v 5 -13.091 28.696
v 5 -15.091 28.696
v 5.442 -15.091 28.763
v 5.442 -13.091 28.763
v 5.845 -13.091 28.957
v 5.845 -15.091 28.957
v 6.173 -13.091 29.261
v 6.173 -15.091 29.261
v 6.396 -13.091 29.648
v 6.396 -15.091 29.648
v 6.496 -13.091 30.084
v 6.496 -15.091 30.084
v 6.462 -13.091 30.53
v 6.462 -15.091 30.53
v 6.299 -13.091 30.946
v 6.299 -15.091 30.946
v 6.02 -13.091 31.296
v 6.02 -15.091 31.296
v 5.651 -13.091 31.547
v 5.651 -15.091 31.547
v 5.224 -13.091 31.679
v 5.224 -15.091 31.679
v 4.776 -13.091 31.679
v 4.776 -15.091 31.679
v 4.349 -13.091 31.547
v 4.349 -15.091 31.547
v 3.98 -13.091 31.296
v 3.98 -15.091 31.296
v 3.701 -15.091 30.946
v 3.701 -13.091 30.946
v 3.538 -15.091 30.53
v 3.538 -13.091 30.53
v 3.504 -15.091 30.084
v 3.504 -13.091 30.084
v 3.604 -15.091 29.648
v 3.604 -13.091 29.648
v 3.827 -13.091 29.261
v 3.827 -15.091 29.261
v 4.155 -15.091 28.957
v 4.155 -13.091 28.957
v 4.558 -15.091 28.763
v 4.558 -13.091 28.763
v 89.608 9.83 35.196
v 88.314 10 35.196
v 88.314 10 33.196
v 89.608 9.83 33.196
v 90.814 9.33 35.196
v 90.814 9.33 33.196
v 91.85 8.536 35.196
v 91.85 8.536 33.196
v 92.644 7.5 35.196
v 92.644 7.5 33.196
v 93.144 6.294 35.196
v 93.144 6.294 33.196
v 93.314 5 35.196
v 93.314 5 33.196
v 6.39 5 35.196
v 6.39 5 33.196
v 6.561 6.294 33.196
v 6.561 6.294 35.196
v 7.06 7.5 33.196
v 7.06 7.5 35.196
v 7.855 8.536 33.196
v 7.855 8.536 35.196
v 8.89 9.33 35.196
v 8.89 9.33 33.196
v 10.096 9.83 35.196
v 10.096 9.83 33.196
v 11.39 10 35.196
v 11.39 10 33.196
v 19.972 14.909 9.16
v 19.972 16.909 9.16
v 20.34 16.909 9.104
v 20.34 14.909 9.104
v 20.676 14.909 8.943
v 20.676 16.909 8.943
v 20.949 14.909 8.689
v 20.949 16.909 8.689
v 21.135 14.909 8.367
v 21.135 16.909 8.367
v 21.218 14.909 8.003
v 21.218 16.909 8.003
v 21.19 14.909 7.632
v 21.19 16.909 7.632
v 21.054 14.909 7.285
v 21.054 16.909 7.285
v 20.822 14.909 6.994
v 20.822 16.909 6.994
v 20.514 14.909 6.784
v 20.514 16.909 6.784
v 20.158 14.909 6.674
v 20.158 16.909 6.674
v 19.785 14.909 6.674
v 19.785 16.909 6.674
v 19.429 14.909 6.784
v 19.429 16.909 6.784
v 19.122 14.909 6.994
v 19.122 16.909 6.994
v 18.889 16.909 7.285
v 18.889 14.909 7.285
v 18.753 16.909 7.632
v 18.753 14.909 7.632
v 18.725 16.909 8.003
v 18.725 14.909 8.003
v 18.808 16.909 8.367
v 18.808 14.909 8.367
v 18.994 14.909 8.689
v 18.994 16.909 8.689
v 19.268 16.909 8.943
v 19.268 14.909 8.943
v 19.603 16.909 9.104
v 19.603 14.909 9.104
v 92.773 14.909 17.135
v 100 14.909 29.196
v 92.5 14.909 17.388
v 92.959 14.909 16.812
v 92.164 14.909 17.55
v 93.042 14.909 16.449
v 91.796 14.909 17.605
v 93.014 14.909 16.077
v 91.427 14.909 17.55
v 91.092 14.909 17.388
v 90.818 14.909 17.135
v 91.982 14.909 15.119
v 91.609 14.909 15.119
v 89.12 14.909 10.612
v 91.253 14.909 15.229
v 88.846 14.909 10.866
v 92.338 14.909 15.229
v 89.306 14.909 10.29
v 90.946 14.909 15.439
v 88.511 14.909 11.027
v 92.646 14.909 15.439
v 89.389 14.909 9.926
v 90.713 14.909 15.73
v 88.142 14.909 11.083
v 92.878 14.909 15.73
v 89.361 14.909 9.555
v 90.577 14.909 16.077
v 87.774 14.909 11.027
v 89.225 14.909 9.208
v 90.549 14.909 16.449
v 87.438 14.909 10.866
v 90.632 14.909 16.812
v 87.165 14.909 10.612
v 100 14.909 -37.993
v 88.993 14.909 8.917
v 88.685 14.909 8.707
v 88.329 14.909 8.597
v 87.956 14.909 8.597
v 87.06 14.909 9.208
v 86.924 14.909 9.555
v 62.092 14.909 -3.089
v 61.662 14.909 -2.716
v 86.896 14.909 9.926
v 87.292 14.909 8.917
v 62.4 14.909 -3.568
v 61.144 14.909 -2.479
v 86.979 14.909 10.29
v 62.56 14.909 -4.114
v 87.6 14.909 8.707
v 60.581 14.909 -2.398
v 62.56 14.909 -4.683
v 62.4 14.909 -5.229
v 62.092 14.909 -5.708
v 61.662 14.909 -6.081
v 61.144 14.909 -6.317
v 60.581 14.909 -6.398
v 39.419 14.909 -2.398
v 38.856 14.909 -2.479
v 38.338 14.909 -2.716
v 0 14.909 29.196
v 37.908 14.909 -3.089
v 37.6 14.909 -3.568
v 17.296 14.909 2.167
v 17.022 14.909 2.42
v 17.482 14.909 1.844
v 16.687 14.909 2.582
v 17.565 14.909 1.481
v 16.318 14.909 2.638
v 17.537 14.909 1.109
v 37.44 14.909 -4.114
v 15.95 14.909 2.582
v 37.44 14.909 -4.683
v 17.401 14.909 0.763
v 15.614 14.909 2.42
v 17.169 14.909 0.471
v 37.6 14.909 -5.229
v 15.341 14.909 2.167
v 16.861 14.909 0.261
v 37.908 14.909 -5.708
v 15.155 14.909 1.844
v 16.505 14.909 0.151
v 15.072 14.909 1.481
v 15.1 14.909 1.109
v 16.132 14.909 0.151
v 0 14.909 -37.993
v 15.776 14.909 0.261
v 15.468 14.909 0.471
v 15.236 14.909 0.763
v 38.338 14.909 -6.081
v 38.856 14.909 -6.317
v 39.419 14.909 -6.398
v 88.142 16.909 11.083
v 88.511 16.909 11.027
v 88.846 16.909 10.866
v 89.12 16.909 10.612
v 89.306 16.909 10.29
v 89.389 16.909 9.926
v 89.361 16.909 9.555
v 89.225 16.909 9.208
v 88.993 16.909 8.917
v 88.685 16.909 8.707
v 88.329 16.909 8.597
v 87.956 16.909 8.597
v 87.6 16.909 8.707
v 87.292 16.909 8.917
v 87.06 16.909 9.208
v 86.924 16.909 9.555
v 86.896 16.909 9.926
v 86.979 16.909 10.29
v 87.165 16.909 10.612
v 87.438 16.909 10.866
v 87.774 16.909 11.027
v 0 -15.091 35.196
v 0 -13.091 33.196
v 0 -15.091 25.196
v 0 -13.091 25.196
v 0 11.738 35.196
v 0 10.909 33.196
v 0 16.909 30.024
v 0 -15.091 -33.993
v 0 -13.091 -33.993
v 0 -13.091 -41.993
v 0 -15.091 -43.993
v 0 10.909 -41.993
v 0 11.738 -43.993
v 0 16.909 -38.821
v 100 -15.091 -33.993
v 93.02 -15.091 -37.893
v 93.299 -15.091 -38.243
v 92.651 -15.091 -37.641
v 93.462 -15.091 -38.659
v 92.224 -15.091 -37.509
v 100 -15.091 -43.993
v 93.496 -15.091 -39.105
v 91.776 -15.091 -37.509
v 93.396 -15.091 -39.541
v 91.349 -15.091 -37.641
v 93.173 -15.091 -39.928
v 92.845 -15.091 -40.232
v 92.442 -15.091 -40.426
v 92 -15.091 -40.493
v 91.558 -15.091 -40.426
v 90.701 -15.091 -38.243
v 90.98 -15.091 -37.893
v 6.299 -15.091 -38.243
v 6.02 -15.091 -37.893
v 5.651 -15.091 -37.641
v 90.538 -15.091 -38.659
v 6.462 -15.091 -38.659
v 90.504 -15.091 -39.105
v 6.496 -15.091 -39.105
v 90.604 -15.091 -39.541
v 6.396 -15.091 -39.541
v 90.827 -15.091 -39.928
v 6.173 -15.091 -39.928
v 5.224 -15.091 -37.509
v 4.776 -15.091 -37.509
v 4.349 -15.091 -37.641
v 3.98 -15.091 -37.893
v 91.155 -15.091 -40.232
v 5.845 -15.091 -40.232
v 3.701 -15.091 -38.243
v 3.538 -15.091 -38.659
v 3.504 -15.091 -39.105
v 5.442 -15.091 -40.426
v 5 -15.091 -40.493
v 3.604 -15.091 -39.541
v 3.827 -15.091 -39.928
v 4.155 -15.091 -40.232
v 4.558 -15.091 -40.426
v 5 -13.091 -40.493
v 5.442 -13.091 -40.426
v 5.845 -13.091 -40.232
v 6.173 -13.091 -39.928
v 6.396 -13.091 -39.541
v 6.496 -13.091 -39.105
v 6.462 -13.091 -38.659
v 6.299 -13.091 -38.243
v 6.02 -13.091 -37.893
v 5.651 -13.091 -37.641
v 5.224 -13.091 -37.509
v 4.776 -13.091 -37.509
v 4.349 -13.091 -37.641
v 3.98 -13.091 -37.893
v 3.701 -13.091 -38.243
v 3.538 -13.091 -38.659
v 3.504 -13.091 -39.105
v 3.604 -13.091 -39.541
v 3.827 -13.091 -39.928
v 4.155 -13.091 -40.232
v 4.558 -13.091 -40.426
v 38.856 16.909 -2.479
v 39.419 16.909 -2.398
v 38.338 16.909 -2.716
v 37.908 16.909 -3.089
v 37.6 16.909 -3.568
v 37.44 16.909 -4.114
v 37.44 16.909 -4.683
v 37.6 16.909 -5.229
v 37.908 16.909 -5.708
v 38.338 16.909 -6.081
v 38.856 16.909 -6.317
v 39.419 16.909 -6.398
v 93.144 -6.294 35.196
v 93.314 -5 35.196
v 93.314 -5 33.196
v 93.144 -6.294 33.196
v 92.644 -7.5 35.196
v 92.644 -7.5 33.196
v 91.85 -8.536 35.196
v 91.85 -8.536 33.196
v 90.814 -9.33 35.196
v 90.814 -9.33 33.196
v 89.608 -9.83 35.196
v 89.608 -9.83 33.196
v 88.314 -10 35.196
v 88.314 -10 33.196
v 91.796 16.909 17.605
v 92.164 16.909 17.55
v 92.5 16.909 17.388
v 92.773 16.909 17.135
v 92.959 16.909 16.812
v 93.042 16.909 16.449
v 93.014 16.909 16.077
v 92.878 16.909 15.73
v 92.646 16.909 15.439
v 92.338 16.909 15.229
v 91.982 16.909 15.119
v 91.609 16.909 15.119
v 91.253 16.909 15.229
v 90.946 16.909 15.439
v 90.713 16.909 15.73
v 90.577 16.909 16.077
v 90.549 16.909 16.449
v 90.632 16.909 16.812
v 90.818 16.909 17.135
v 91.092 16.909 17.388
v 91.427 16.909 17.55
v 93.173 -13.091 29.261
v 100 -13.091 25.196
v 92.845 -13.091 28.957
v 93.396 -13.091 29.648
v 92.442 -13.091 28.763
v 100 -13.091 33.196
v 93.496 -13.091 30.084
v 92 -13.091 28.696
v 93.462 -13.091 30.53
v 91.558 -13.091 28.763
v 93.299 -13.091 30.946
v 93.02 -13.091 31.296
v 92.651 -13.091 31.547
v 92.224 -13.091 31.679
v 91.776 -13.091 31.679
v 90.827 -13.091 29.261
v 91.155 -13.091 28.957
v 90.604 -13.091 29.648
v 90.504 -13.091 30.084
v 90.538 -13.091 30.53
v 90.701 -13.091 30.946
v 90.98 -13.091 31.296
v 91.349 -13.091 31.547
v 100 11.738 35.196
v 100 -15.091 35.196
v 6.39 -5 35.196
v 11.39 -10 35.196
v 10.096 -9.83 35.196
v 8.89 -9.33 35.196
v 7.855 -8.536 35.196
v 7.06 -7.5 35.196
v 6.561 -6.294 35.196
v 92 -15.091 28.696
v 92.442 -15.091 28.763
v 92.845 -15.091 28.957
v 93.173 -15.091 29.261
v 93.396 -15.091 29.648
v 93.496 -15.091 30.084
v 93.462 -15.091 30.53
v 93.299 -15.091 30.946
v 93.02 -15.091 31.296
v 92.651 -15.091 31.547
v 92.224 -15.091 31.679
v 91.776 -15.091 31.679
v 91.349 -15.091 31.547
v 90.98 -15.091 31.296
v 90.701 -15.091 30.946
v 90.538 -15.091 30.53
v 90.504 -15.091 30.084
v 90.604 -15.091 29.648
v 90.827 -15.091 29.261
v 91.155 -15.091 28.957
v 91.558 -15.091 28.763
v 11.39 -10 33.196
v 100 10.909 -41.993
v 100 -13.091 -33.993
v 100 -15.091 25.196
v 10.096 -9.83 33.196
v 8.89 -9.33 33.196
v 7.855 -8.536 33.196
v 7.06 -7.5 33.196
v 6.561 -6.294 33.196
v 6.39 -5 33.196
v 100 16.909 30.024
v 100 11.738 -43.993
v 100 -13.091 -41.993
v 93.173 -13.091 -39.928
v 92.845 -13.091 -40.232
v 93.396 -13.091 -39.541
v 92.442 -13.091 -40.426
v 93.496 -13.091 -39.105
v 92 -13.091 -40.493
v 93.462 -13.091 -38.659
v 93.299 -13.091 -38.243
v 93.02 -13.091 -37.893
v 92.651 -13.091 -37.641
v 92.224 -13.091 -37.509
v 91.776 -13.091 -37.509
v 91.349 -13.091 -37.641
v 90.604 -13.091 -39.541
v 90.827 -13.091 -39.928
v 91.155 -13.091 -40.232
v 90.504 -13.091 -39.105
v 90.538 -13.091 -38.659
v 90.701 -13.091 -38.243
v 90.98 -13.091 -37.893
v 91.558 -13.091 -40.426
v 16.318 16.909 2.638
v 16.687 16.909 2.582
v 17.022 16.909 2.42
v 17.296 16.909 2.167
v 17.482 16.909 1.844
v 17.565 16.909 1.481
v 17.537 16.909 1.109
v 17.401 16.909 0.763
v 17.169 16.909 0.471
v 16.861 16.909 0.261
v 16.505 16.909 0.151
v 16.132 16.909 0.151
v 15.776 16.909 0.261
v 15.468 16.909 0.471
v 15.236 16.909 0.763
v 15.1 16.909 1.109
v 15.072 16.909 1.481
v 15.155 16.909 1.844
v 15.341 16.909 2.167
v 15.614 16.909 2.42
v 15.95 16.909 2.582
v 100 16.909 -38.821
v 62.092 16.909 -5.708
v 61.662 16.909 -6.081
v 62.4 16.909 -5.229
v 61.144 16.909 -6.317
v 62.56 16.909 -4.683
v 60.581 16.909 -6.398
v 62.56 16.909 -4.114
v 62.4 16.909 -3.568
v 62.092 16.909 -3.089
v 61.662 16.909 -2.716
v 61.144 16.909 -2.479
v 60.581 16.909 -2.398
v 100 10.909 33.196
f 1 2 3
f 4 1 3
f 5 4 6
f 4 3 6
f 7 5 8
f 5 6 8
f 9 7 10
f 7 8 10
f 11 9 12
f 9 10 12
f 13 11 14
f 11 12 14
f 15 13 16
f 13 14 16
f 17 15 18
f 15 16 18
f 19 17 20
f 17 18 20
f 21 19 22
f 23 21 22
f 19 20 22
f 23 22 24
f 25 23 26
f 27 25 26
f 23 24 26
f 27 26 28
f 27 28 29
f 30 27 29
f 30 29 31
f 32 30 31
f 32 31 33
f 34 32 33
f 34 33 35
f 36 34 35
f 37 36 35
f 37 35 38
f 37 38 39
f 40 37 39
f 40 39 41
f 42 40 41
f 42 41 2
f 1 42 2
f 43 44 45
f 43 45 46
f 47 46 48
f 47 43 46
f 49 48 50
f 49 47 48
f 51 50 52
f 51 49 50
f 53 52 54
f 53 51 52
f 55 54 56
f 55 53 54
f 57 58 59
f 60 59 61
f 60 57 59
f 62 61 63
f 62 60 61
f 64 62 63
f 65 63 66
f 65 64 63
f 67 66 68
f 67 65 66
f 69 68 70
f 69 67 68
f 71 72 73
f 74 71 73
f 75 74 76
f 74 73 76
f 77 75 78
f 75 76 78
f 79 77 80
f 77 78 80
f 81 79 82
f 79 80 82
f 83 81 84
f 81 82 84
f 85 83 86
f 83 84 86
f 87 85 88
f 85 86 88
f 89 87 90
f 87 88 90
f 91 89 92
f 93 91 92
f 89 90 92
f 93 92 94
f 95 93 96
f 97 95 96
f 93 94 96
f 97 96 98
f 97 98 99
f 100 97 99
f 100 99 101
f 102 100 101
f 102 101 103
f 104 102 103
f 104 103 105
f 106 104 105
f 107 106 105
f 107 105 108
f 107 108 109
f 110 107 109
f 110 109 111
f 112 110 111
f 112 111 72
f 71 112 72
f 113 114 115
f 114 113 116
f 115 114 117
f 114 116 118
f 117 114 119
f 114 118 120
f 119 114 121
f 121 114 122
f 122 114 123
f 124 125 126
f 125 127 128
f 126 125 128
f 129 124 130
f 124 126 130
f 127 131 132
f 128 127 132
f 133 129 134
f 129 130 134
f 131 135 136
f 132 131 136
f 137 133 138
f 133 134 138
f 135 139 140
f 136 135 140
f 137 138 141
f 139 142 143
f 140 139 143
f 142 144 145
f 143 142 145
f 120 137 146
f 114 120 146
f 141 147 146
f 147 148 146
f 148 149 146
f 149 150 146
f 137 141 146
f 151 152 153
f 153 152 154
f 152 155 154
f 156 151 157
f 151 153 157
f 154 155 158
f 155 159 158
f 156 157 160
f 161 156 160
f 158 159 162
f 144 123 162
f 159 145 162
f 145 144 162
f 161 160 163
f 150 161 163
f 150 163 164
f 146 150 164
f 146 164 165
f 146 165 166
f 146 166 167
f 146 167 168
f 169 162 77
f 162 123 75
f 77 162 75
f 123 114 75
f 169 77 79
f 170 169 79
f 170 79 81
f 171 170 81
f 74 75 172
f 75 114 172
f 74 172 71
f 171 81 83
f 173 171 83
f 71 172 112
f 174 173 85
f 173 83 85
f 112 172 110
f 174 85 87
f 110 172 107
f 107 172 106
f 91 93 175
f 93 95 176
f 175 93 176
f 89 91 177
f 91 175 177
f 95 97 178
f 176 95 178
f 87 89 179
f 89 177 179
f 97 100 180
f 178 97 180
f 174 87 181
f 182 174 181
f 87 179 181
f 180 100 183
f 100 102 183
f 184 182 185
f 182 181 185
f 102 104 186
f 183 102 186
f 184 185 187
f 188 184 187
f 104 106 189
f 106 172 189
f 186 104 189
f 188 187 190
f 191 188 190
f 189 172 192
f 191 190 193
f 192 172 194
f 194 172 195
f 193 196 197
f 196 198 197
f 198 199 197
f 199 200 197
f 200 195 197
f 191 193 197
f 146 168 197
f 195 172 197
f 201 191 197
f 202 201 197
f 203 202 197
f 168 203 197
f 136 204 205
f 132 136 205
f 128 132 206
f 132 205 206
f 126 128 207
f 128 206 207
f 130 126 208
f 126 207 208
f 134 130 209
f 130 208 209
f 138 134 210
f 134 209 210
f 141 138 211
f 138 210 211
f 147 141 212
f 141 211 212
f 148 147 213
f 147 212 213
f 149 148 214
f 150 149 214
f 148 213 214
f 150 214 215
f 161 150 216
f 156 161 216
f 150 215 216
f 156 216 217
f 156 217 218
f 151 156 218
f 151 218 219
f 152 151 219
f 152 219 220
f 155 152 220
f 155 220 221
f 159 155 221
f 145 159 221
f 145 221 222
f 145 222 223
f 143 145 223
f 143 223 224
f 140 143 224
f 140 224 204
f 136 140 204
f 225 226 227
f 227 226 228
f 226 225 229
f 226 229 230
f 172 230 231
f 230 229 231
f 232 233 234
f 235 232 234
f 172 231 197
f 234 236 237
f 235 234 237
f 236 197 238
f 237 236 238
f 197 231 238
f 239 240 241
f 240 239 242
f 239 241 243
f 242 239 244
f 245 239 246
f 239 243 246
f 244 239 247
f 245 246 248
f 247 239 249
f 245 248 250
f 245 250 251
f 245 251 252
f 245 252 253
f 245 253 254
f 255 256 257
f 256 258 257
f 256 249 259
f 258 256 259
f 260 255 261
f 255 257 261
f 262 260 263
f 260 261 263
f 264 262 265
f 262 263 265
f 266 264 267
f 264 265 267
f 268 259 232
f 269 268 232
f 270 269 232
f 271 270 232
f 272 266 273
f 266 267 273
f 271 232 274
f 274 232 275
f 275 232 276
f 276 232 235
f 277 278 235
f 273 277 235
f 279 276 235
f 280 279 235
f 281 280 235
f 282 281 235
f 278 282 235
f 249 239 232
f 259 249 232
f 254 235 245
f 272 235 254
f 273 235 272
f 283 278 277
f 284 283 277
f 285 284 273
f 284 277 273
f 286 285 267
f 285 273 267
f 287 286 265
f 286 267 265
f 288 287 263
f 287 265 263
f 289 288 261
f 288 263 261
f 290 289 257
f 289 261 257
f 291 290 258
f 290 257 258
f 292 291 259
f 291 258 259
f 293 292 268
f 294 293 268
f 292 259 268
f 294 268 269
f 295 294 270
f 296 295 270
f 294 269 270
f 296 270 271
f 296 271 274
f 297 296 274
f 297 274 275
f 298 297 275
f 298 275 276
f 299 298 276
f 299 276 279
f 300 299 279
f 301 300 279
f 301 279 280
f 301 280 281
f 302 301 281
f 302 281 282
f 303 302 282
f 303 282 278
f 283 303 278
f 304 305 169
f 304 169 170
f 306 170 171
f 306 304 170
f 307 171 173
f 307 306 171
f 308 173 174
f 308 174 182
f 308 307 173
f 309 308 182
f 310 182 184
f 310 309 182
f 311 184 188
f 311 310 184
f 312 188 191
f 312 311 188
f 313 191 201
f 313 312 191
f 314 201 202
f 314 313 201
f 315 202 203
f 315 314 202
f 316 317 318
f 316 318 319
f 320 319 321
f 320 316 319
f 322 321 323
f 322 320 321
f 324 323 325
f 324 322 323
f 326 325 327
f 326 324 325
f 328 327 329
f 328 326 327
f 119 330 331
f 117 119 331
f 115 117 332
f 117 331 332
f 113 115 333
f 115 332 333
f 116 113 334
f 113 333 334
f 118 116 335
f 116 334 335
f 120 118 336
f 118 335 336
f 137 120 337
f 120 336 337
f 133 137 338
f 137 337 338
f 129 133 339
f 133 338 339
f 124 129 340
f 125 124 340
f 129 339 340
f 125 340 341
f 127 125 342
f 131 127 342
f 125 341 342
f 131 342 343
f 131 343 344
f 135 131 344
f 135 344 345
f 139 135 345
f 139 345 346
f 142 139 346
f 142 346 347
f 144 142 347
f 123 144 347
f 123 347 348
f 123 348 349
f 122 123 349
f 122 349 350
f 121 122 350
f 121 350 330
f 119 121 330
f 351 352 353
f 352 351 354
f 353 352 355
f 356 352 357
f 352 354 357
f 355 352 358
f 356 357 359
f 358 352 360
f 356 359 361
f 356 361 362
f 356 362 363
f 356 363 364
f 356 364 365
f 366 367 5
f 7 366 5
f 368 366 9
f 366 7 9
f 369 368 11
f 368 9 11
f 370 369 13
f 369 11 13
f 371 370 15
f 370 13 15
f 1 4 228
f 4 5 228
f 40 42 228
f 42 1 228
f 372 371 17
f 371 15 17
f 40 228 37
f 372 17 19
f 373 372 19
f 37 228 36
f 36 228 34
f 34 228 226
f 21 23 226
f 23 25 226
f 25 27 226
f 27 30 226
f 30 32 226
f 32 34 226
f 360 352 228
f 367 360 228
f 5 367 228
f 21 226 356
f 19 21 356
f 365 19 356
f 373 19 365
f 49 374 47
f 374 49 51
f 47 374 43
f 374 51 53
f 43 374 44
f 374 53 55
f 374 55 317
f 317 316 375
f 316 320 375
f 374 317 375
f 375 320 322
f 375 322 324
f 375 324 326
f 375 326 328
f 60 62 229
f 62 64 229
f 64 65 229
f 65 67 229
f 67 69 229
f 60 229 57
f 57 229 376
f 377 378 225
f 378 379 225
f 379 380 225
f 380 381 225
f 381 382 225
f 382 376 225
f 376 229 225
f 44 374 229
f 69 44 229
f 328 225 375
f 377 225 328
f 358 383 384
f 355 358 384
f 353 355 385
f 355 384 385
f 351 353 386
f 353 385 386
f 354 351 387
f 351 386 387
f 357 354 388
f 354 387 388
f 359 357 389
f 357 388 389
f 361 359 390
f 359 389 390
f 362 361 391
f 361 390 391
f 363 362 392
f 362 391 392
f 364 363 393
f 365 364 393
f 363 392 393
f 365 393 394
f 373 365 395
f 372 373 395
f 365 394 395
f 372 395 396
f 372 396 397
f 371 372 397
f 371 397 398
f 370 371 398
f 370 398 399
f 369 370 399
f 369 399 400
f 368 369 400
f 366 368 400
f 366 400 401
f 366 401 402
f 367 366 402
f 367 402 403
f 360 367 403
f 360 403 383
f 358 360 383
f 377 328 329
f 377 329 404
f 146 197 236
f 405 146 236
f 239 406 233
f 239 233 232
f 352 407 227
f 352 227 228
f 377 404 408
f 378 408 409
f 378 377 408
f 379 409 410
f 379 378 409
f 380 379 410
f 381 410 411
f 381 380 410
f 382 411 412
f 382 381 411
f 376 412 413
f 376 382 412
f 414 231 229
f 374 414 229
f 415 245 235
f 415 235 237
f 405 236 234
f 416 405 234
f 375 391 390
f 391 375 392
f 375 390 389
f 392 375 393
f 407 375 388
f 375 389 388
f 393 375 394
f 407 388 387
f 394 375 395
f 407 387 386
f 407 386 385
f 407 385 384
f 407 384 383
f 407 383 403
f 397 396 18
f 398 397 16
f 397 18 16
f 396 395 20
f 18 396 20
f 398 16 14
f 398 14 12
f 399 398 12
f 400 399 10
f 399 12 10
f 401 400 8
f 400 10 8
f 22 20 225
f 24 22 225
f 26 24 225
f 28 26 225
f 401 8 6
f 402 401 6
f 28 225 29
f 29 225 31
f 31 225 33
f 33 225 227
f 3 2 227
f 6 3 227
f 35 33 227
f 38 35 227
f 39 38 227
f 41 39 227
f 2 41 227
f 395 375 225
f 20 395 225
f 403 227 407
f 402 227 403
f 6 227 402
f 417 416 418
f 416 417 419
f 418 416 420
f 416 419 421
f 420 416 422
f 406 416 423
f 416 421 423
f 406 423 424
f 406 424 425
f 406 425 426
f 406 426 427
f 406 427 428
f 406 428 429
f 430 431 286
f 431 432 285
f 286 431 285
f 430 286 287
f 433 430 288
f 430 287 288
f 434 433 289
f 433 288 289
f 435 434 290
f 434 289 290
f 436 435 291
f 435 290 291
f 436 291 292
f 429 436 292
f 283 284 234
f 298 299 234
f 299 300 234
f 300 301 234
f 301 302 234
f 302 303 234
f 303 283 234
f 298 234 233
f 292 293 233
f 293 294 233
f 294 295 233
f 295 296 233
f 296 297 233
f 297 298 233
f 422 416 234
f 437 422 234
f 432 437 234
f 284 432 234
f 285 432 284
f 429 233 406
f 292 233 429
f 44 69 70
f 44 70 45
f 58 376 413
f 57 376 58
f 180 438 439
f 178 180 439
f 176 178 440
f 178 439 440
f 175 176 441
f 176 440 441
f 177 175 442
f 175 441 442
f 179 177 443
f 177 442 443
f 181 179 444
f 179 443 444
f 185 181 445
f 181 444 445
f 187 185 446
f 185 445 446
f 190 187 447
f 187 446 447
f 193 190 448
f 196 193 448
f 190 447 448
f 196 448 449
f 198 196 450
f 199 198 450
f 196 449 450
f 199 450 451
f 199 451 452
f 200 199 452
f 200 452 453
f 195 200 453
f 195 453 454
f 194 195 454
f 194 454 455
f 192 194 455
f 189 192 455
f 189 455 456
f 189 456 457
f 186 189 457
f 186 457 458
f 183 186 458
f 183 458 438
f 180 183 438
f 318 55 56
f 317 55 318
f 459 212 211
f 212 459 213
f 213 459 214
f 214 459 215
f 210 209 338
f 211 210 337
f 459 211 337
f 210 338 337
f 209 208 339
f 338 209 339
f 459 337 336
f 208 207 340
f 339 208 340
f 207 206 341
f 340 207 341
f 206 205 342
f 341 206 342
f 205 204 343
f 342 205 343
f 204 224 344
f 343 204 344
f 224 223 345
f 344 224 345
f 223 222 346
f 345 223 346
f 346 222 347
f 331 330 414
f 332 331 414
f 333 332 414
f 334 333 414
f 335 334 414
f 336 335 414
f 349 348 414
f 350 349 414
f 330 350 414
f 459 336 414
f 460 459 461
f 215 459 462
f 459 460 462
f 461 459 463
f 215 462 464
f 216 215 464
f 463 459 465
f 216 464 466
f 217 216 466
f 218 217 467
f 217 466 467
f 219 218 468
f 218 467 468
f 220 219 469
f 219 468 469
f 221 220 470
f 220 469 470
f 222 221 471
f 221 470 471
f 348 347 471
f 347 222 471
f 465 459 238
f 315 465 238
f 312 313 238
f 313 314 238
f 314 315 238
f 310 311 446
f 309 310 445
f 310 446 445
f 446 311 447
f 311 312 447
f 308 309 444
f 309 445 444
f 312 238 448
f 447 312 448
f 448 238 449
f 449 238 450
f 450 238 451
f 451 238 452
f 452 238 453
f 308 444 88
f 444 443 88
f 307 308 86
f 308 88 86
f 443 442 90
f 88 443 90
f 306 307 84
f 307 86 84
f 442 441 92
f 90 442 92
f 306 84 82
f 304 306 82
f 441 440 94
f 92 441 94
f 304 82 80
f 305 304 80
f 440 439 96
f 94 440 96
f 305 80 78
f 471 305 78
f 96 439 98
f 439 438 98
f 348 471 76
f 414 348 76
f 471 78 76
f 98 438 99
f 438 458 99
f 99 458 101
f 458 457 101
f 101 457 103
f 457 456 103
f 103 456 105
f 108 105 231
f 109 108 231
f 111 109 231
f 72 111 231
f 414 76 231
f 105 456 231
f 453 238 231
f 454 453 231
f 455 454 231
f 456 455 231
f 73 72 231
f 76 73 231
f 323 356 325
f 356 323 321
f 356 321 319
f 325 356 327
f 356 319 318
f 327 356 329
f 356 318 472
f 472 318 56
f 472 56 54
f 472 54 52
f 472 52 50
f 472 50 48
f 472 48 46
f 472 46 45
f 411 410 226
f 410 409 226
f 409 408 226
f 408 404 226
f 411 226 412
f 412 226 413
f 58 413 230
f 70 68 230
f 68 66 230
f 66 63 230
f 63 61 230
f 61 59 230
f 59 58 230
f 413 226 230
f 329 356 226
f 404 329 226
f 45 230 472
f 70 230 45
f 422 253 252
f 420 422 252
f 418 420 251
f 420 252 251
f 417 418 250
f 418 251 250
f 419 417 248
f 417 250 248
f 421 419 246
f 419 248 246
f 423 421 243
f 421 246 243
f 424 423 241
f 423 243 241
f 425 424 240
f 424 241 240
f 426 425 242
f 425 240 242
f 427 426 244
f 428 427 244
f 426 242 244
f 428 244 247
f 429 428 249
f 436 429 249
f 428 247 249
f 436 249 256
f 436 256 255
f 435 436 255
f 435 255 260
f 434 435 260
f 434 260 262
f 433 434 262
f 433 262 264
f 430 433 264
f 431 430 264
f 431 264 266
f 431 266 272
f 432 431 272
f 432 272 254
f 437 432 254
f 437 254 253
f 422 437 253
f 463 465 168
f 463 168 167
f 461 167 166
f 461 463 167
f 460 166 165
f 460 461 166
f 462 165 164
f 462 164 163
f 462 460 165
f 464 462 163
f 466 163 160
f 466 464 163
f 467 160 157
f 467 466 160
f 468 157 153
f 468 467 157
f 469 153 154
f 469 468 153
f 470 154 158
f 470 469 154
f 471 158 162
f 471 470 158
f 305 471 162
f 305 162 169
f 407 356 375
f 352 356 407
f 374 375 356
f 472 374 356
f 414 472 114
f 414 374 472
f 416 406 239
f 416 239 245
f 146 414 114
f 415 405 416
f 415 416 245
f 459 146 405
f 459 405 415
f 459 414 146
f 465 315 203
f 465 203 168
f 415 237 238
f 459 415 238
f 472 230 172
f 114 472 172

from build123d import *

# Parameters (mm, degrees)
BOSS_EXTRUDE1_DEPTH = 100
SKETCH5_R           = 1.5
CUT_EXTRUDE3_DEPTH  = 4
CUT_EXTRUDE5_REACH  = 130.673
CUT_EXTRUDE6_REACH  = 115.839
SKETCH11_R          = 1.25
CUT_EXTRUDE4_DEPTH  = 2


with BuildPart() as part:
    # Sketch1 → Boss-Extrude1 (new body)
    with BuildSketch(Plane(origin=(0, 0, 0), x_dir=(0, 0, -1), z_dir=(1, 0, 0))):
        Polygon((-25.195982579, -13.090802774), (-33.195982579, -13.090802774), (-33.195982579, 10.909197226), (-29.195982579, 14.909197226), (37.992717903, 14.909197226), (41.992717903, 10.909197226), (41.992717903, -13.090802774), (33.992717903, -13.090802774), (33.992717903, -15.090802774), (43.992717903, -15.090802774), (43.992717903, 11.73762435), (38.821145028, 16.909197226), (-30.024409703, 16.909197226), (-35.195982579, 11.73762435), (-35.195982579, -15.090802774), (-25.195982579, -15.090802774), align=None)
    extrude(amount=BOSS_EXTRUDE1_DEPTH)

    # Sketch5 → Cut-Extrude3 (cut)
    with BuildSketch(Plane.XZ.offset(15.090802774)):
        with Locations((5, 30.195982579)):
            Circle(SKETCH5_R)
        with Locations((92, 30.195982579)):
            Circle(SKETCH5_R)
        with Locations((92, -38.992717903)):
            Circle(SKETCH5_R)
        with Locations((5, -38.992717903)):
            Circle(SKETCH5_R)
    extrude(amount=-CUT_EXTRUDE3_DEPTH, mode=Mode.SUBTRACT)

    # Sketch10 → Cut-Extrude5 (cut, up to next)
    with BuildSketch(Plane.XY.offset(35.195982579), mode=Mode.PRIVATE) as cut_extrude5_sk1:
        with BuildLine():
            Line((11.390334367, 10), (88.31435142, 10))
            ThreePointArc((88.31435142, 10), (91.849885326, 8.535533906), (93.31435142, 5))
            Line((93.31435142, 5), (93.31435142, -5))
            ThreePointArc((93.31435142, -5), (91.849885326, -8.535533906), (88.31435142, -10))
            Line((88.31435142, -10), (11.390334367, -10))
            ThreePointArc((11.390334367, -10), (7.854800461, -8.535533906), (6.390334367, -5))
            Line((6.390334367, -5), (6.390334367, 5))
            ThreePointArc((6.390334367, 5), (7.854800461, 8.535533906), (11.390334367, 10))
        make_face()
    cut_extrude5_tool1 = extrude(cut_extrude5_sk1.sketch, amount=-CUT_EXTRUDE5_REACH, mode=Mode.PRIVATE) & part.part
    add(cut_extrude5_tool1.solids().sort_by_distance((49.852343, 0, 35.195983))[0], mode=Mode.SUBTRACT)

    # Sketch11 → Cut-Extrude6 (cut, up to next)
    with BuildSketch(Plane(origin=(0, 16.909197226, 0), x_dir=(1, 0, 0), z_dir=(0, 1, 0)), mode=Mode.PRIVATE) as cut_extrude6_sk1:
        with Locations((19.971775687, -7.910031108)):
            Circle(SKETCH11_R)
    cut_extrude6_tool1 = extrude(cut_extrude6_sk1.sketch, amount=-CUT_EXTRUDE6_REACH, mode=Mode.PRIVATE) & part.part
    # Sketch11 → Cut-Extrude6 (cut, up to next)
    with BuildSketch(Plane(origin=(0, 16.909197226, 0), x_dir=(1, 0, 0), z_dir=(0, 1, 0)), mode=Mode.PRIVATE) as cut_extrude6_sk2:
        with Locations((91.79572832, -16.355424806)):
            Circle(SKETCH11_R)
    cut_extrude6_tool2 = extrude(cut_extrude6_sk2.sketch, amount=-CUT_EXTRUDE6_REACH, mode=Mode.PRIVATE) & part.part
    # Sketch11 → Cut-Extrude6 (cut, up to next)
    with BuildSketch(Plane(origin=(0, 16.909197226, 0), x_dir=(1, 0, 0), z_dir=(0, 1, 0)), mode=Mode.PRIVATE) as cut_extrude6_sk3:
        with Locations((16.318342756, -1.387534759)):
            Circle(SKETCH11_R)
    cut_extrude6_tool3 = extrude(cut_extrude6_sk3.sketch, amount=-CUT_EXTRUDE6_REACH, mode=Mode.PRIVATE) & part.part
    # Sketch11 → Cut-Extrude6 (cut, up to next)
    with BuildSketch(Plane(origin=(0, 16.909197226, 0), x_dir=(1, 0, 0), z_dir=(0, 1, 0)), mode=Mode.PRIVATE) as cut_extrude6_sk4:
        with Locations((88.142295389, -9.832928457)):
            Circle(SKETCH11_R)
    cut_extrude6_tool4 = extrude(cut_extrude6_sk4.sketch, amount=-CUT_EXTRUDE6_REACH, mode=Mode.PRIVATE) & part.part
    add(cut_extrude6_tool1.solids().sort_by_distance((19.971776, 16.909197, 7.910031))[0], mode=Mode.SUBTRACT)
    add(cut_extrude6_tool2.solids().sort_by_distance((91.795728, 16.909197, 16.355425))[0], mode=Mode.SUBTRACT)
    add(cut_extrude6_tool3.solids().sort_by_distance((16.318343, 16.909197, 1.387535))[0], mode=Mode.SUBTRACT)
    add(cut_extrude6_tool4.solids().sort_by_distance((88.142295, 16.909197, 9.832928))[0], mode=Mode.SUBTRACT)

    # Sketch7 → Cut-Extrude4 (cut)
    with BuildSketch(Plane(origin=(0, 16.909197226, 0), x_dir=(1, 0, 0), z_dir=(0, 1, 0))):
        with BuildLine():
            Line((39.419167918, 6.398367662), (60.580832082, 6.398367662))
            ThreePointArc((60.580832082, 6.398367662), (62.580832082, 4.398367662), (60.580832082, 2.398367662))
            Line((60.580832082, 2.398367662), (39.419167918, 2.398367662))
            ThreePointArc((39.419167918, 2.398367662), (37.419167918, 4.398367662), (39.419167918, 6.398367662))
        make_face()
    extrude(amount=-CUT_EXTRUDE4_DEPTH, mode=Mode.SUBTRACT)


solid = part.part
